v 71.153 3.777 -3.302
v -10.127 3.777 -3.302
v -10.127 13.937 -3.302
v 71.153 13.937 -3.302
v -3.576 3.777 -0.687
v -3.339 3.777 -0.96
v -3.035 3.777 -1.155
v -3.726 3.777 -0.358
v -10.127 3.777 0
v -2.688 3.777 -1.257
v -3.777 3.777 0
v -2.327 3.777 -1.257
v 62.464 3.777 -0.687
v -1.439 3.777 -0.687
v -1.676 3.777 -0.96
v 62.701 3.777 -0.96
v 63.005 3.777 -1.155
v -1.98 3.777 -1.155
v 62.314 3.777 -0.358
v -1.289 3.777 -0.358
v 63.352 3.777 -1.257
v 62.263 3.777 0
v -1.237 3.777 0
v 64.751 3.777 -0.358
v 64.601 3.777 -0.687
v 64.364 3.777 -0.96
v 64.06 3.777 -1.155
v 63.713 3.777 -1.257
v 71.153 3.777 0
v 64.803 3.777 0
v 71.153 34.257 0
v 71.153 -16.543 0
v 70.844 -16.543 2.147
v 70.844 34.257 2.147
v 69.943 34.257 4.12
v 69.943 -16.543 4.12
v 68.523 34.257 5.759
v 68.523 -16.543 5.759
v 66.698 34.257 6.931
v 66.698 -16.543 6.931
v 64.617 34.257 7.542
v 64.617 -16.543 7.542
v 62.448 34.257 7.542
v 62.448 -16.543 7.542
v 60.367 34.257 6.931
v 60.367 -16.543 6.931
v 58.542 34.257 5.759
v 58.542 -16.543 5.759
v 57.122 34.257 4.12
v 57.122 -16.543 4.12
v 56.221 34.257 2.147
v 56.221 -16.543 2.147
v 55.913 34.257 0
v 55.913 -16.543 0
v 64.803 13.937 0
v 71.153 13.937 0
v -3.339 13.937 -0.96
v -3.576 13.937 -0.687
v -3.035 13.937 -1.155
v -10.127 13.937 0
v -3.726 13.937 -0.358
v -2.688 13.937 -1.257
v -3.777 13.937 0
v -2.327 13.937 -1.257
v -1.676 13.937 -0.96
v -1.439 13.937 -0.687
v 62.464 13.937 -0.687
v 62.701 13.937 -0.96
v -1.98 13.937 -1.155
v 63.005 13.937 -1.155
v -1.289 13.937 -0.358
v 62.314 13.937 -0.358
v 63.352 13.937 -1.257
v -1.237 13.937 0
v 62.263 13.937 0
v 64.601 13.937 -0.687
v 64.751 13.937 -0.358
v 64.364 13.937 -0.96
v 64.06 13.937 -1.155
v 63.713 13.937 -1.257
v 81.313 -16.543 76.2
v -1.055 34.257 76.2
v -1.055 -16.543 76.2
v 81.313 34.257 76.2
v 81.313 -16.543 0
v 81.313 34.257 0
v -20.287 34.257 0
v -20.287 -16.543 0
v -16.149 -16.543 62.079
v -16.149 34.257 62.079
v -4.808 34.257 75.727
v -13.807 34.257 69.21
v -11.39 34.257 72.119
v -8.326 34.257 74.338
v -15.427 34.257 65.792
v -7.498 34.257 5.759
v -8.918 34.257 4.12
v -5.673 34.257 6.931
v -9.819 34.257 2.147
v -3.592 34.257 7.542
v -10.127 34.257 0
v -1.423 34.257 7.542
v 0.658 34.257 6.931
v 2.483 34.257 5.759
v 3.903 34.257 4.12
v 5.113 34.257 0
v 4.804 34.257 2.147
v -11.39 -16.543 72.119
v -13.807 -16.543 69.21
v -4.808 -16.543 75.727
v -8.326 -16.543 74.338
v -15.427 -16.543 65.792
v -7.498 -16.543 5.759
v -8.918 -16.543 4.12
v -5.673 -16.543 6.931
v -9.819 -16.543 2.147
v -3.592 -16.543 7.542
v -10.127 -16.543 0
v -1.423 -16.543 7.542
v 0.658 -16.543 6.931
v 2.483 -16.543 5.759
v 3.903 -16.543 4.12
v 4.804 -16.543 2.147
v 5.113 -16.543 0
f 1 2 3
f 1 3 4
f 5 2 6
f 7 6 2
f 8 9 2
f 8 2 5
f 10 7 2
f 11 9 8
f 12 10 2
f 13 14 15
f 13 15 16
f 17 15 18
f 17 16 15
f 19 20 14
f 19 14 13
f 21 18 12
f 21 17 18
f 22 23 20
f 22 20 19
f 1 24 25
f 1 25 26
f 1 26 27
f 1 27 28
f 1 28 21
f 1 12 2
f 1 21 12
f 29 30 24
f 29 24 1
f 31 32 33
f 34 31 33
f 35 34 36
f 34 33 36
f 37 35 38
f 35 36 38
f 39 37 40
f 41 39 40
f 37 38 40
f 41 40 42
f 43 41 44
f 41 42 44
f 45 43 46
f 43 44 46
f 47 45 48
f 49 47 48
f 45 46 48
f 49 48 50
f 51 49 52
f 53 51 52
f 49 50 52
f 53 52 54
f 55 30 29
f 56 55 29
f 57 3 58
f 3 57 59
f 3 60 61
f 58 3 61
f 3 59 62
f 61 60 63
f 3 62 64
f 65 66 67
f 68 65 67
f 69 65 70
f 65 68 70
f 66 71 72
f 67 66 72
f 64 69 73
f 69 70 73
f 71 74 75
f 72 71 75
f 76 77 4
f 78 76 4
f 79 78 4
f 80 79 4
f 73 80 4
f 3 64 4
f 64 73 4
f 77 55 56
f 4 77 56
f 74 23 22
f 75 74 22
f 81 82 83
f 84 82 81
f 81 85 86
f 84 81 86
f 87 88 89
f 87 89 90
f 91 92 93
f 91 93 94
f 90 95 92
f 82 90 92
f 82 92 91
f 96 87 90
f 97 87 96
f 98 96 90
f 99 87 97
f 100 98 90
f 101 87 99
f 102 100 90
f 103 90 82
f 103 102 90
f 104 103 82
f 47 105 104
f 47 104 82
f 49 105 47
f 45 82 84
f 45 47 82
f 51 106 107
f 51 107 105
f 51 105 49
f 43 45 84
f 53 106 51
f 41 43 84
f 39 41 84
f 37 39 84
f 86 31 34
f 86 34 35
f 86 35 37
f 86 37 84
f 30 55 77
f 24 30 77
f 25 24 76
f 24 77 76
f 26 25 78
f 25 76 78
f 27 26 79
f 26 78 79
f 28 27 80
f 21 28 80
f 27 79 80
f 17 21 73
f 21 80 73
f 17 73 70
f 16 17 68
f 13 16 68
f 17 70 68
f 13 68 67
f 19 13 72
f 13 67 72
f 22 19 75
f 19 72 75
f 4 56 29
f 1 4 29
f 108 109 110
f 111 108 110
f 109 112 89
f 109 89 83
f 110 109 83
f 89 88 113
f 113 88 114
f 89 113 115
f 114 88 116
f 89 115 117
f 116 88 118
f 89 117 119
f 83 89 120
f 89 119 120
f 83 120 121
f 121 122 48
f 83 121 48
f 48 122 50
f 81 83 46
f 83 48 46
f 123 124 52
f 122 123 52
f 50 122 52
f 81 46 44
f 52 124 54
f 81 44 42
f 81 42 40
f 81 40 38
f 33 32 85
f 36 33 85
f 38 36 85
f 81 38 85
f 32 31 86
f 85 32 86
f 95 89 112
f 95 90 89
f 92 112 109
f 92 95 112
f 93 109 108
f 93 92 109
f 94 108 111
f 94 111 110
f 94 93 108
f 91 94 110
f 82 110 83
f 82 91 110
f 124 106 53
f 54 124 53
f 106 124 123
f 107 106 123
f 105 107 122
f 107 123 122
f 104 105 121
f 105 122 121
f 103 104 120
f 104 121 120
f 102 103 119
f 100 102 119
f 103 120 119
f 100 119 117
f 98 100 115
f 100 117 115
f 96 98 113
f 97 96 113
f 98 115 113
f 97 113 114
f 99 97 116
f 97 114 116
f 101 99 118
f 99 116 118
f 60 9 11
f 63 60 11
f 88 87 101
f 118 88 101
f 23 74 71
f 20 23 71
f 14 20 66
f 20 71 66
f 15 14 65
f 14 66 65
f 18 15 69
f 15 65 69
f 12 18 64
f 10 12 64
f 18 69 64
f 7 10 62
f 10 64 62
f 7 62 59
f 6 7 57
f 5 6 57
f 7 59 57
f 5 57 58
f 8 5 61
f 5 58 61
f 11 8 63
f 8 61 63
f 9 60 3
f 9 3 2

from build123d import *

# Parameters (mm, degrees)
F0_W     = 101.6
F0_H     = 50.8
F1_DEPTH = 76.2
F3_DEPTH = 50.8
F4_W     = 81.28
F4_H     = 10.16
F5_DEPTH = 3.302
F6_R     = 1.27
F7_DEPTH = 10.16
F8_SIZE2 = 76.19999
F8_SIZE  = 5.07999
F9_R     = 15.1271850899


# Not quite as in the source:
# - a fillet or chamfer is up to 0.001 mm smaller than in the source, because OpenCascade refuses the exact size


with BuildPart() as f1:
    # F0 (on Top) → F1 (new body)
    with BuildSketch(Plane.XY):
        with Locations((30.5125243939, 8.8571563035)):
            Rectangle(F0_W, F0_H)
    extrude(amount=F1_DEPTH)

    # F2 (on face) → F3 (cut)
    with BuildSketch(Plane.XZ.offset(16.5428436965)):
        with BuildLine():
            Line((-2.5074756061, 0), (5.1125243939, 0))
            ThreePointArc((5.1125243939, 0), (-2.5074756061, 7.62), (-10.1274756061, 0))
            Line((-10.1274756061, 0), (-2.5074756061, 0))
        make_face()
        with BuildLine():
            Line((63.5325243939, 0), (71.1525243939, 0))
            ThreePointArc((71.1525243939, 0), (63.5325243939, 7.62), (55.9125243939, 0))
            Line((55.9125243939, 0), (63.5325243939, 0))
        make_face()
    extrude(amount=-F3_DEPTH, mode=Mode.SUBTRACT)

    # F8 (size 5.08 and 76.2 in the source; OpenCascade refuses exactly that, so slightly less here)
    f8_edges = [f1.edges().sort_by_distance(p)[0] for p in [
        (-20.287476, 8.857156, 76.2),
    ]]
    f8_side = f1.faces().sort_by_distance((30.512524, 8.857156, 76.2))[0]
    chamfer(f8_edges, length=F8_SIZE, length2=F8_SIZE2, reference=f8_side)

    # F9
    f9_edges = [f1.edges().sort_by_distance(p)[0] for p in [
        (-15.207486, 8.857156, 76.2),
    ]]
    fillet(f9_edges, radius=F9_R)


with BuildPart() as f5:
    # F4 (on face) → F5 (new body)
    with BuildSketch(Plane(origin=(0, 0, 0), x_dir=(1, 0, 0), z_dir=(0, 0, -1))):
        with Locations((30.5125243939, -8.8571563035)):
            Rectangle(F4_W, F4_H)
    extrude(amount=F5_DEPTH)

    # F6 (on face) → F7 (cut)
    with BuildSketch(Plane(origin=(0, 13.9371563035, 0), x_dir=(-1, 0, 0), z_dir=(0, 1, 0))):
        with Locations((-63.5325243939, 0)):
            Circle(F6_R)
        with Locations((2.5074756061, 0)):
            Circle(F6_R)
    extrude(amount=-F7_DEPTH, mode=Mode.SUBTRACT)


solid = Compound([f1.part, f5.part])
